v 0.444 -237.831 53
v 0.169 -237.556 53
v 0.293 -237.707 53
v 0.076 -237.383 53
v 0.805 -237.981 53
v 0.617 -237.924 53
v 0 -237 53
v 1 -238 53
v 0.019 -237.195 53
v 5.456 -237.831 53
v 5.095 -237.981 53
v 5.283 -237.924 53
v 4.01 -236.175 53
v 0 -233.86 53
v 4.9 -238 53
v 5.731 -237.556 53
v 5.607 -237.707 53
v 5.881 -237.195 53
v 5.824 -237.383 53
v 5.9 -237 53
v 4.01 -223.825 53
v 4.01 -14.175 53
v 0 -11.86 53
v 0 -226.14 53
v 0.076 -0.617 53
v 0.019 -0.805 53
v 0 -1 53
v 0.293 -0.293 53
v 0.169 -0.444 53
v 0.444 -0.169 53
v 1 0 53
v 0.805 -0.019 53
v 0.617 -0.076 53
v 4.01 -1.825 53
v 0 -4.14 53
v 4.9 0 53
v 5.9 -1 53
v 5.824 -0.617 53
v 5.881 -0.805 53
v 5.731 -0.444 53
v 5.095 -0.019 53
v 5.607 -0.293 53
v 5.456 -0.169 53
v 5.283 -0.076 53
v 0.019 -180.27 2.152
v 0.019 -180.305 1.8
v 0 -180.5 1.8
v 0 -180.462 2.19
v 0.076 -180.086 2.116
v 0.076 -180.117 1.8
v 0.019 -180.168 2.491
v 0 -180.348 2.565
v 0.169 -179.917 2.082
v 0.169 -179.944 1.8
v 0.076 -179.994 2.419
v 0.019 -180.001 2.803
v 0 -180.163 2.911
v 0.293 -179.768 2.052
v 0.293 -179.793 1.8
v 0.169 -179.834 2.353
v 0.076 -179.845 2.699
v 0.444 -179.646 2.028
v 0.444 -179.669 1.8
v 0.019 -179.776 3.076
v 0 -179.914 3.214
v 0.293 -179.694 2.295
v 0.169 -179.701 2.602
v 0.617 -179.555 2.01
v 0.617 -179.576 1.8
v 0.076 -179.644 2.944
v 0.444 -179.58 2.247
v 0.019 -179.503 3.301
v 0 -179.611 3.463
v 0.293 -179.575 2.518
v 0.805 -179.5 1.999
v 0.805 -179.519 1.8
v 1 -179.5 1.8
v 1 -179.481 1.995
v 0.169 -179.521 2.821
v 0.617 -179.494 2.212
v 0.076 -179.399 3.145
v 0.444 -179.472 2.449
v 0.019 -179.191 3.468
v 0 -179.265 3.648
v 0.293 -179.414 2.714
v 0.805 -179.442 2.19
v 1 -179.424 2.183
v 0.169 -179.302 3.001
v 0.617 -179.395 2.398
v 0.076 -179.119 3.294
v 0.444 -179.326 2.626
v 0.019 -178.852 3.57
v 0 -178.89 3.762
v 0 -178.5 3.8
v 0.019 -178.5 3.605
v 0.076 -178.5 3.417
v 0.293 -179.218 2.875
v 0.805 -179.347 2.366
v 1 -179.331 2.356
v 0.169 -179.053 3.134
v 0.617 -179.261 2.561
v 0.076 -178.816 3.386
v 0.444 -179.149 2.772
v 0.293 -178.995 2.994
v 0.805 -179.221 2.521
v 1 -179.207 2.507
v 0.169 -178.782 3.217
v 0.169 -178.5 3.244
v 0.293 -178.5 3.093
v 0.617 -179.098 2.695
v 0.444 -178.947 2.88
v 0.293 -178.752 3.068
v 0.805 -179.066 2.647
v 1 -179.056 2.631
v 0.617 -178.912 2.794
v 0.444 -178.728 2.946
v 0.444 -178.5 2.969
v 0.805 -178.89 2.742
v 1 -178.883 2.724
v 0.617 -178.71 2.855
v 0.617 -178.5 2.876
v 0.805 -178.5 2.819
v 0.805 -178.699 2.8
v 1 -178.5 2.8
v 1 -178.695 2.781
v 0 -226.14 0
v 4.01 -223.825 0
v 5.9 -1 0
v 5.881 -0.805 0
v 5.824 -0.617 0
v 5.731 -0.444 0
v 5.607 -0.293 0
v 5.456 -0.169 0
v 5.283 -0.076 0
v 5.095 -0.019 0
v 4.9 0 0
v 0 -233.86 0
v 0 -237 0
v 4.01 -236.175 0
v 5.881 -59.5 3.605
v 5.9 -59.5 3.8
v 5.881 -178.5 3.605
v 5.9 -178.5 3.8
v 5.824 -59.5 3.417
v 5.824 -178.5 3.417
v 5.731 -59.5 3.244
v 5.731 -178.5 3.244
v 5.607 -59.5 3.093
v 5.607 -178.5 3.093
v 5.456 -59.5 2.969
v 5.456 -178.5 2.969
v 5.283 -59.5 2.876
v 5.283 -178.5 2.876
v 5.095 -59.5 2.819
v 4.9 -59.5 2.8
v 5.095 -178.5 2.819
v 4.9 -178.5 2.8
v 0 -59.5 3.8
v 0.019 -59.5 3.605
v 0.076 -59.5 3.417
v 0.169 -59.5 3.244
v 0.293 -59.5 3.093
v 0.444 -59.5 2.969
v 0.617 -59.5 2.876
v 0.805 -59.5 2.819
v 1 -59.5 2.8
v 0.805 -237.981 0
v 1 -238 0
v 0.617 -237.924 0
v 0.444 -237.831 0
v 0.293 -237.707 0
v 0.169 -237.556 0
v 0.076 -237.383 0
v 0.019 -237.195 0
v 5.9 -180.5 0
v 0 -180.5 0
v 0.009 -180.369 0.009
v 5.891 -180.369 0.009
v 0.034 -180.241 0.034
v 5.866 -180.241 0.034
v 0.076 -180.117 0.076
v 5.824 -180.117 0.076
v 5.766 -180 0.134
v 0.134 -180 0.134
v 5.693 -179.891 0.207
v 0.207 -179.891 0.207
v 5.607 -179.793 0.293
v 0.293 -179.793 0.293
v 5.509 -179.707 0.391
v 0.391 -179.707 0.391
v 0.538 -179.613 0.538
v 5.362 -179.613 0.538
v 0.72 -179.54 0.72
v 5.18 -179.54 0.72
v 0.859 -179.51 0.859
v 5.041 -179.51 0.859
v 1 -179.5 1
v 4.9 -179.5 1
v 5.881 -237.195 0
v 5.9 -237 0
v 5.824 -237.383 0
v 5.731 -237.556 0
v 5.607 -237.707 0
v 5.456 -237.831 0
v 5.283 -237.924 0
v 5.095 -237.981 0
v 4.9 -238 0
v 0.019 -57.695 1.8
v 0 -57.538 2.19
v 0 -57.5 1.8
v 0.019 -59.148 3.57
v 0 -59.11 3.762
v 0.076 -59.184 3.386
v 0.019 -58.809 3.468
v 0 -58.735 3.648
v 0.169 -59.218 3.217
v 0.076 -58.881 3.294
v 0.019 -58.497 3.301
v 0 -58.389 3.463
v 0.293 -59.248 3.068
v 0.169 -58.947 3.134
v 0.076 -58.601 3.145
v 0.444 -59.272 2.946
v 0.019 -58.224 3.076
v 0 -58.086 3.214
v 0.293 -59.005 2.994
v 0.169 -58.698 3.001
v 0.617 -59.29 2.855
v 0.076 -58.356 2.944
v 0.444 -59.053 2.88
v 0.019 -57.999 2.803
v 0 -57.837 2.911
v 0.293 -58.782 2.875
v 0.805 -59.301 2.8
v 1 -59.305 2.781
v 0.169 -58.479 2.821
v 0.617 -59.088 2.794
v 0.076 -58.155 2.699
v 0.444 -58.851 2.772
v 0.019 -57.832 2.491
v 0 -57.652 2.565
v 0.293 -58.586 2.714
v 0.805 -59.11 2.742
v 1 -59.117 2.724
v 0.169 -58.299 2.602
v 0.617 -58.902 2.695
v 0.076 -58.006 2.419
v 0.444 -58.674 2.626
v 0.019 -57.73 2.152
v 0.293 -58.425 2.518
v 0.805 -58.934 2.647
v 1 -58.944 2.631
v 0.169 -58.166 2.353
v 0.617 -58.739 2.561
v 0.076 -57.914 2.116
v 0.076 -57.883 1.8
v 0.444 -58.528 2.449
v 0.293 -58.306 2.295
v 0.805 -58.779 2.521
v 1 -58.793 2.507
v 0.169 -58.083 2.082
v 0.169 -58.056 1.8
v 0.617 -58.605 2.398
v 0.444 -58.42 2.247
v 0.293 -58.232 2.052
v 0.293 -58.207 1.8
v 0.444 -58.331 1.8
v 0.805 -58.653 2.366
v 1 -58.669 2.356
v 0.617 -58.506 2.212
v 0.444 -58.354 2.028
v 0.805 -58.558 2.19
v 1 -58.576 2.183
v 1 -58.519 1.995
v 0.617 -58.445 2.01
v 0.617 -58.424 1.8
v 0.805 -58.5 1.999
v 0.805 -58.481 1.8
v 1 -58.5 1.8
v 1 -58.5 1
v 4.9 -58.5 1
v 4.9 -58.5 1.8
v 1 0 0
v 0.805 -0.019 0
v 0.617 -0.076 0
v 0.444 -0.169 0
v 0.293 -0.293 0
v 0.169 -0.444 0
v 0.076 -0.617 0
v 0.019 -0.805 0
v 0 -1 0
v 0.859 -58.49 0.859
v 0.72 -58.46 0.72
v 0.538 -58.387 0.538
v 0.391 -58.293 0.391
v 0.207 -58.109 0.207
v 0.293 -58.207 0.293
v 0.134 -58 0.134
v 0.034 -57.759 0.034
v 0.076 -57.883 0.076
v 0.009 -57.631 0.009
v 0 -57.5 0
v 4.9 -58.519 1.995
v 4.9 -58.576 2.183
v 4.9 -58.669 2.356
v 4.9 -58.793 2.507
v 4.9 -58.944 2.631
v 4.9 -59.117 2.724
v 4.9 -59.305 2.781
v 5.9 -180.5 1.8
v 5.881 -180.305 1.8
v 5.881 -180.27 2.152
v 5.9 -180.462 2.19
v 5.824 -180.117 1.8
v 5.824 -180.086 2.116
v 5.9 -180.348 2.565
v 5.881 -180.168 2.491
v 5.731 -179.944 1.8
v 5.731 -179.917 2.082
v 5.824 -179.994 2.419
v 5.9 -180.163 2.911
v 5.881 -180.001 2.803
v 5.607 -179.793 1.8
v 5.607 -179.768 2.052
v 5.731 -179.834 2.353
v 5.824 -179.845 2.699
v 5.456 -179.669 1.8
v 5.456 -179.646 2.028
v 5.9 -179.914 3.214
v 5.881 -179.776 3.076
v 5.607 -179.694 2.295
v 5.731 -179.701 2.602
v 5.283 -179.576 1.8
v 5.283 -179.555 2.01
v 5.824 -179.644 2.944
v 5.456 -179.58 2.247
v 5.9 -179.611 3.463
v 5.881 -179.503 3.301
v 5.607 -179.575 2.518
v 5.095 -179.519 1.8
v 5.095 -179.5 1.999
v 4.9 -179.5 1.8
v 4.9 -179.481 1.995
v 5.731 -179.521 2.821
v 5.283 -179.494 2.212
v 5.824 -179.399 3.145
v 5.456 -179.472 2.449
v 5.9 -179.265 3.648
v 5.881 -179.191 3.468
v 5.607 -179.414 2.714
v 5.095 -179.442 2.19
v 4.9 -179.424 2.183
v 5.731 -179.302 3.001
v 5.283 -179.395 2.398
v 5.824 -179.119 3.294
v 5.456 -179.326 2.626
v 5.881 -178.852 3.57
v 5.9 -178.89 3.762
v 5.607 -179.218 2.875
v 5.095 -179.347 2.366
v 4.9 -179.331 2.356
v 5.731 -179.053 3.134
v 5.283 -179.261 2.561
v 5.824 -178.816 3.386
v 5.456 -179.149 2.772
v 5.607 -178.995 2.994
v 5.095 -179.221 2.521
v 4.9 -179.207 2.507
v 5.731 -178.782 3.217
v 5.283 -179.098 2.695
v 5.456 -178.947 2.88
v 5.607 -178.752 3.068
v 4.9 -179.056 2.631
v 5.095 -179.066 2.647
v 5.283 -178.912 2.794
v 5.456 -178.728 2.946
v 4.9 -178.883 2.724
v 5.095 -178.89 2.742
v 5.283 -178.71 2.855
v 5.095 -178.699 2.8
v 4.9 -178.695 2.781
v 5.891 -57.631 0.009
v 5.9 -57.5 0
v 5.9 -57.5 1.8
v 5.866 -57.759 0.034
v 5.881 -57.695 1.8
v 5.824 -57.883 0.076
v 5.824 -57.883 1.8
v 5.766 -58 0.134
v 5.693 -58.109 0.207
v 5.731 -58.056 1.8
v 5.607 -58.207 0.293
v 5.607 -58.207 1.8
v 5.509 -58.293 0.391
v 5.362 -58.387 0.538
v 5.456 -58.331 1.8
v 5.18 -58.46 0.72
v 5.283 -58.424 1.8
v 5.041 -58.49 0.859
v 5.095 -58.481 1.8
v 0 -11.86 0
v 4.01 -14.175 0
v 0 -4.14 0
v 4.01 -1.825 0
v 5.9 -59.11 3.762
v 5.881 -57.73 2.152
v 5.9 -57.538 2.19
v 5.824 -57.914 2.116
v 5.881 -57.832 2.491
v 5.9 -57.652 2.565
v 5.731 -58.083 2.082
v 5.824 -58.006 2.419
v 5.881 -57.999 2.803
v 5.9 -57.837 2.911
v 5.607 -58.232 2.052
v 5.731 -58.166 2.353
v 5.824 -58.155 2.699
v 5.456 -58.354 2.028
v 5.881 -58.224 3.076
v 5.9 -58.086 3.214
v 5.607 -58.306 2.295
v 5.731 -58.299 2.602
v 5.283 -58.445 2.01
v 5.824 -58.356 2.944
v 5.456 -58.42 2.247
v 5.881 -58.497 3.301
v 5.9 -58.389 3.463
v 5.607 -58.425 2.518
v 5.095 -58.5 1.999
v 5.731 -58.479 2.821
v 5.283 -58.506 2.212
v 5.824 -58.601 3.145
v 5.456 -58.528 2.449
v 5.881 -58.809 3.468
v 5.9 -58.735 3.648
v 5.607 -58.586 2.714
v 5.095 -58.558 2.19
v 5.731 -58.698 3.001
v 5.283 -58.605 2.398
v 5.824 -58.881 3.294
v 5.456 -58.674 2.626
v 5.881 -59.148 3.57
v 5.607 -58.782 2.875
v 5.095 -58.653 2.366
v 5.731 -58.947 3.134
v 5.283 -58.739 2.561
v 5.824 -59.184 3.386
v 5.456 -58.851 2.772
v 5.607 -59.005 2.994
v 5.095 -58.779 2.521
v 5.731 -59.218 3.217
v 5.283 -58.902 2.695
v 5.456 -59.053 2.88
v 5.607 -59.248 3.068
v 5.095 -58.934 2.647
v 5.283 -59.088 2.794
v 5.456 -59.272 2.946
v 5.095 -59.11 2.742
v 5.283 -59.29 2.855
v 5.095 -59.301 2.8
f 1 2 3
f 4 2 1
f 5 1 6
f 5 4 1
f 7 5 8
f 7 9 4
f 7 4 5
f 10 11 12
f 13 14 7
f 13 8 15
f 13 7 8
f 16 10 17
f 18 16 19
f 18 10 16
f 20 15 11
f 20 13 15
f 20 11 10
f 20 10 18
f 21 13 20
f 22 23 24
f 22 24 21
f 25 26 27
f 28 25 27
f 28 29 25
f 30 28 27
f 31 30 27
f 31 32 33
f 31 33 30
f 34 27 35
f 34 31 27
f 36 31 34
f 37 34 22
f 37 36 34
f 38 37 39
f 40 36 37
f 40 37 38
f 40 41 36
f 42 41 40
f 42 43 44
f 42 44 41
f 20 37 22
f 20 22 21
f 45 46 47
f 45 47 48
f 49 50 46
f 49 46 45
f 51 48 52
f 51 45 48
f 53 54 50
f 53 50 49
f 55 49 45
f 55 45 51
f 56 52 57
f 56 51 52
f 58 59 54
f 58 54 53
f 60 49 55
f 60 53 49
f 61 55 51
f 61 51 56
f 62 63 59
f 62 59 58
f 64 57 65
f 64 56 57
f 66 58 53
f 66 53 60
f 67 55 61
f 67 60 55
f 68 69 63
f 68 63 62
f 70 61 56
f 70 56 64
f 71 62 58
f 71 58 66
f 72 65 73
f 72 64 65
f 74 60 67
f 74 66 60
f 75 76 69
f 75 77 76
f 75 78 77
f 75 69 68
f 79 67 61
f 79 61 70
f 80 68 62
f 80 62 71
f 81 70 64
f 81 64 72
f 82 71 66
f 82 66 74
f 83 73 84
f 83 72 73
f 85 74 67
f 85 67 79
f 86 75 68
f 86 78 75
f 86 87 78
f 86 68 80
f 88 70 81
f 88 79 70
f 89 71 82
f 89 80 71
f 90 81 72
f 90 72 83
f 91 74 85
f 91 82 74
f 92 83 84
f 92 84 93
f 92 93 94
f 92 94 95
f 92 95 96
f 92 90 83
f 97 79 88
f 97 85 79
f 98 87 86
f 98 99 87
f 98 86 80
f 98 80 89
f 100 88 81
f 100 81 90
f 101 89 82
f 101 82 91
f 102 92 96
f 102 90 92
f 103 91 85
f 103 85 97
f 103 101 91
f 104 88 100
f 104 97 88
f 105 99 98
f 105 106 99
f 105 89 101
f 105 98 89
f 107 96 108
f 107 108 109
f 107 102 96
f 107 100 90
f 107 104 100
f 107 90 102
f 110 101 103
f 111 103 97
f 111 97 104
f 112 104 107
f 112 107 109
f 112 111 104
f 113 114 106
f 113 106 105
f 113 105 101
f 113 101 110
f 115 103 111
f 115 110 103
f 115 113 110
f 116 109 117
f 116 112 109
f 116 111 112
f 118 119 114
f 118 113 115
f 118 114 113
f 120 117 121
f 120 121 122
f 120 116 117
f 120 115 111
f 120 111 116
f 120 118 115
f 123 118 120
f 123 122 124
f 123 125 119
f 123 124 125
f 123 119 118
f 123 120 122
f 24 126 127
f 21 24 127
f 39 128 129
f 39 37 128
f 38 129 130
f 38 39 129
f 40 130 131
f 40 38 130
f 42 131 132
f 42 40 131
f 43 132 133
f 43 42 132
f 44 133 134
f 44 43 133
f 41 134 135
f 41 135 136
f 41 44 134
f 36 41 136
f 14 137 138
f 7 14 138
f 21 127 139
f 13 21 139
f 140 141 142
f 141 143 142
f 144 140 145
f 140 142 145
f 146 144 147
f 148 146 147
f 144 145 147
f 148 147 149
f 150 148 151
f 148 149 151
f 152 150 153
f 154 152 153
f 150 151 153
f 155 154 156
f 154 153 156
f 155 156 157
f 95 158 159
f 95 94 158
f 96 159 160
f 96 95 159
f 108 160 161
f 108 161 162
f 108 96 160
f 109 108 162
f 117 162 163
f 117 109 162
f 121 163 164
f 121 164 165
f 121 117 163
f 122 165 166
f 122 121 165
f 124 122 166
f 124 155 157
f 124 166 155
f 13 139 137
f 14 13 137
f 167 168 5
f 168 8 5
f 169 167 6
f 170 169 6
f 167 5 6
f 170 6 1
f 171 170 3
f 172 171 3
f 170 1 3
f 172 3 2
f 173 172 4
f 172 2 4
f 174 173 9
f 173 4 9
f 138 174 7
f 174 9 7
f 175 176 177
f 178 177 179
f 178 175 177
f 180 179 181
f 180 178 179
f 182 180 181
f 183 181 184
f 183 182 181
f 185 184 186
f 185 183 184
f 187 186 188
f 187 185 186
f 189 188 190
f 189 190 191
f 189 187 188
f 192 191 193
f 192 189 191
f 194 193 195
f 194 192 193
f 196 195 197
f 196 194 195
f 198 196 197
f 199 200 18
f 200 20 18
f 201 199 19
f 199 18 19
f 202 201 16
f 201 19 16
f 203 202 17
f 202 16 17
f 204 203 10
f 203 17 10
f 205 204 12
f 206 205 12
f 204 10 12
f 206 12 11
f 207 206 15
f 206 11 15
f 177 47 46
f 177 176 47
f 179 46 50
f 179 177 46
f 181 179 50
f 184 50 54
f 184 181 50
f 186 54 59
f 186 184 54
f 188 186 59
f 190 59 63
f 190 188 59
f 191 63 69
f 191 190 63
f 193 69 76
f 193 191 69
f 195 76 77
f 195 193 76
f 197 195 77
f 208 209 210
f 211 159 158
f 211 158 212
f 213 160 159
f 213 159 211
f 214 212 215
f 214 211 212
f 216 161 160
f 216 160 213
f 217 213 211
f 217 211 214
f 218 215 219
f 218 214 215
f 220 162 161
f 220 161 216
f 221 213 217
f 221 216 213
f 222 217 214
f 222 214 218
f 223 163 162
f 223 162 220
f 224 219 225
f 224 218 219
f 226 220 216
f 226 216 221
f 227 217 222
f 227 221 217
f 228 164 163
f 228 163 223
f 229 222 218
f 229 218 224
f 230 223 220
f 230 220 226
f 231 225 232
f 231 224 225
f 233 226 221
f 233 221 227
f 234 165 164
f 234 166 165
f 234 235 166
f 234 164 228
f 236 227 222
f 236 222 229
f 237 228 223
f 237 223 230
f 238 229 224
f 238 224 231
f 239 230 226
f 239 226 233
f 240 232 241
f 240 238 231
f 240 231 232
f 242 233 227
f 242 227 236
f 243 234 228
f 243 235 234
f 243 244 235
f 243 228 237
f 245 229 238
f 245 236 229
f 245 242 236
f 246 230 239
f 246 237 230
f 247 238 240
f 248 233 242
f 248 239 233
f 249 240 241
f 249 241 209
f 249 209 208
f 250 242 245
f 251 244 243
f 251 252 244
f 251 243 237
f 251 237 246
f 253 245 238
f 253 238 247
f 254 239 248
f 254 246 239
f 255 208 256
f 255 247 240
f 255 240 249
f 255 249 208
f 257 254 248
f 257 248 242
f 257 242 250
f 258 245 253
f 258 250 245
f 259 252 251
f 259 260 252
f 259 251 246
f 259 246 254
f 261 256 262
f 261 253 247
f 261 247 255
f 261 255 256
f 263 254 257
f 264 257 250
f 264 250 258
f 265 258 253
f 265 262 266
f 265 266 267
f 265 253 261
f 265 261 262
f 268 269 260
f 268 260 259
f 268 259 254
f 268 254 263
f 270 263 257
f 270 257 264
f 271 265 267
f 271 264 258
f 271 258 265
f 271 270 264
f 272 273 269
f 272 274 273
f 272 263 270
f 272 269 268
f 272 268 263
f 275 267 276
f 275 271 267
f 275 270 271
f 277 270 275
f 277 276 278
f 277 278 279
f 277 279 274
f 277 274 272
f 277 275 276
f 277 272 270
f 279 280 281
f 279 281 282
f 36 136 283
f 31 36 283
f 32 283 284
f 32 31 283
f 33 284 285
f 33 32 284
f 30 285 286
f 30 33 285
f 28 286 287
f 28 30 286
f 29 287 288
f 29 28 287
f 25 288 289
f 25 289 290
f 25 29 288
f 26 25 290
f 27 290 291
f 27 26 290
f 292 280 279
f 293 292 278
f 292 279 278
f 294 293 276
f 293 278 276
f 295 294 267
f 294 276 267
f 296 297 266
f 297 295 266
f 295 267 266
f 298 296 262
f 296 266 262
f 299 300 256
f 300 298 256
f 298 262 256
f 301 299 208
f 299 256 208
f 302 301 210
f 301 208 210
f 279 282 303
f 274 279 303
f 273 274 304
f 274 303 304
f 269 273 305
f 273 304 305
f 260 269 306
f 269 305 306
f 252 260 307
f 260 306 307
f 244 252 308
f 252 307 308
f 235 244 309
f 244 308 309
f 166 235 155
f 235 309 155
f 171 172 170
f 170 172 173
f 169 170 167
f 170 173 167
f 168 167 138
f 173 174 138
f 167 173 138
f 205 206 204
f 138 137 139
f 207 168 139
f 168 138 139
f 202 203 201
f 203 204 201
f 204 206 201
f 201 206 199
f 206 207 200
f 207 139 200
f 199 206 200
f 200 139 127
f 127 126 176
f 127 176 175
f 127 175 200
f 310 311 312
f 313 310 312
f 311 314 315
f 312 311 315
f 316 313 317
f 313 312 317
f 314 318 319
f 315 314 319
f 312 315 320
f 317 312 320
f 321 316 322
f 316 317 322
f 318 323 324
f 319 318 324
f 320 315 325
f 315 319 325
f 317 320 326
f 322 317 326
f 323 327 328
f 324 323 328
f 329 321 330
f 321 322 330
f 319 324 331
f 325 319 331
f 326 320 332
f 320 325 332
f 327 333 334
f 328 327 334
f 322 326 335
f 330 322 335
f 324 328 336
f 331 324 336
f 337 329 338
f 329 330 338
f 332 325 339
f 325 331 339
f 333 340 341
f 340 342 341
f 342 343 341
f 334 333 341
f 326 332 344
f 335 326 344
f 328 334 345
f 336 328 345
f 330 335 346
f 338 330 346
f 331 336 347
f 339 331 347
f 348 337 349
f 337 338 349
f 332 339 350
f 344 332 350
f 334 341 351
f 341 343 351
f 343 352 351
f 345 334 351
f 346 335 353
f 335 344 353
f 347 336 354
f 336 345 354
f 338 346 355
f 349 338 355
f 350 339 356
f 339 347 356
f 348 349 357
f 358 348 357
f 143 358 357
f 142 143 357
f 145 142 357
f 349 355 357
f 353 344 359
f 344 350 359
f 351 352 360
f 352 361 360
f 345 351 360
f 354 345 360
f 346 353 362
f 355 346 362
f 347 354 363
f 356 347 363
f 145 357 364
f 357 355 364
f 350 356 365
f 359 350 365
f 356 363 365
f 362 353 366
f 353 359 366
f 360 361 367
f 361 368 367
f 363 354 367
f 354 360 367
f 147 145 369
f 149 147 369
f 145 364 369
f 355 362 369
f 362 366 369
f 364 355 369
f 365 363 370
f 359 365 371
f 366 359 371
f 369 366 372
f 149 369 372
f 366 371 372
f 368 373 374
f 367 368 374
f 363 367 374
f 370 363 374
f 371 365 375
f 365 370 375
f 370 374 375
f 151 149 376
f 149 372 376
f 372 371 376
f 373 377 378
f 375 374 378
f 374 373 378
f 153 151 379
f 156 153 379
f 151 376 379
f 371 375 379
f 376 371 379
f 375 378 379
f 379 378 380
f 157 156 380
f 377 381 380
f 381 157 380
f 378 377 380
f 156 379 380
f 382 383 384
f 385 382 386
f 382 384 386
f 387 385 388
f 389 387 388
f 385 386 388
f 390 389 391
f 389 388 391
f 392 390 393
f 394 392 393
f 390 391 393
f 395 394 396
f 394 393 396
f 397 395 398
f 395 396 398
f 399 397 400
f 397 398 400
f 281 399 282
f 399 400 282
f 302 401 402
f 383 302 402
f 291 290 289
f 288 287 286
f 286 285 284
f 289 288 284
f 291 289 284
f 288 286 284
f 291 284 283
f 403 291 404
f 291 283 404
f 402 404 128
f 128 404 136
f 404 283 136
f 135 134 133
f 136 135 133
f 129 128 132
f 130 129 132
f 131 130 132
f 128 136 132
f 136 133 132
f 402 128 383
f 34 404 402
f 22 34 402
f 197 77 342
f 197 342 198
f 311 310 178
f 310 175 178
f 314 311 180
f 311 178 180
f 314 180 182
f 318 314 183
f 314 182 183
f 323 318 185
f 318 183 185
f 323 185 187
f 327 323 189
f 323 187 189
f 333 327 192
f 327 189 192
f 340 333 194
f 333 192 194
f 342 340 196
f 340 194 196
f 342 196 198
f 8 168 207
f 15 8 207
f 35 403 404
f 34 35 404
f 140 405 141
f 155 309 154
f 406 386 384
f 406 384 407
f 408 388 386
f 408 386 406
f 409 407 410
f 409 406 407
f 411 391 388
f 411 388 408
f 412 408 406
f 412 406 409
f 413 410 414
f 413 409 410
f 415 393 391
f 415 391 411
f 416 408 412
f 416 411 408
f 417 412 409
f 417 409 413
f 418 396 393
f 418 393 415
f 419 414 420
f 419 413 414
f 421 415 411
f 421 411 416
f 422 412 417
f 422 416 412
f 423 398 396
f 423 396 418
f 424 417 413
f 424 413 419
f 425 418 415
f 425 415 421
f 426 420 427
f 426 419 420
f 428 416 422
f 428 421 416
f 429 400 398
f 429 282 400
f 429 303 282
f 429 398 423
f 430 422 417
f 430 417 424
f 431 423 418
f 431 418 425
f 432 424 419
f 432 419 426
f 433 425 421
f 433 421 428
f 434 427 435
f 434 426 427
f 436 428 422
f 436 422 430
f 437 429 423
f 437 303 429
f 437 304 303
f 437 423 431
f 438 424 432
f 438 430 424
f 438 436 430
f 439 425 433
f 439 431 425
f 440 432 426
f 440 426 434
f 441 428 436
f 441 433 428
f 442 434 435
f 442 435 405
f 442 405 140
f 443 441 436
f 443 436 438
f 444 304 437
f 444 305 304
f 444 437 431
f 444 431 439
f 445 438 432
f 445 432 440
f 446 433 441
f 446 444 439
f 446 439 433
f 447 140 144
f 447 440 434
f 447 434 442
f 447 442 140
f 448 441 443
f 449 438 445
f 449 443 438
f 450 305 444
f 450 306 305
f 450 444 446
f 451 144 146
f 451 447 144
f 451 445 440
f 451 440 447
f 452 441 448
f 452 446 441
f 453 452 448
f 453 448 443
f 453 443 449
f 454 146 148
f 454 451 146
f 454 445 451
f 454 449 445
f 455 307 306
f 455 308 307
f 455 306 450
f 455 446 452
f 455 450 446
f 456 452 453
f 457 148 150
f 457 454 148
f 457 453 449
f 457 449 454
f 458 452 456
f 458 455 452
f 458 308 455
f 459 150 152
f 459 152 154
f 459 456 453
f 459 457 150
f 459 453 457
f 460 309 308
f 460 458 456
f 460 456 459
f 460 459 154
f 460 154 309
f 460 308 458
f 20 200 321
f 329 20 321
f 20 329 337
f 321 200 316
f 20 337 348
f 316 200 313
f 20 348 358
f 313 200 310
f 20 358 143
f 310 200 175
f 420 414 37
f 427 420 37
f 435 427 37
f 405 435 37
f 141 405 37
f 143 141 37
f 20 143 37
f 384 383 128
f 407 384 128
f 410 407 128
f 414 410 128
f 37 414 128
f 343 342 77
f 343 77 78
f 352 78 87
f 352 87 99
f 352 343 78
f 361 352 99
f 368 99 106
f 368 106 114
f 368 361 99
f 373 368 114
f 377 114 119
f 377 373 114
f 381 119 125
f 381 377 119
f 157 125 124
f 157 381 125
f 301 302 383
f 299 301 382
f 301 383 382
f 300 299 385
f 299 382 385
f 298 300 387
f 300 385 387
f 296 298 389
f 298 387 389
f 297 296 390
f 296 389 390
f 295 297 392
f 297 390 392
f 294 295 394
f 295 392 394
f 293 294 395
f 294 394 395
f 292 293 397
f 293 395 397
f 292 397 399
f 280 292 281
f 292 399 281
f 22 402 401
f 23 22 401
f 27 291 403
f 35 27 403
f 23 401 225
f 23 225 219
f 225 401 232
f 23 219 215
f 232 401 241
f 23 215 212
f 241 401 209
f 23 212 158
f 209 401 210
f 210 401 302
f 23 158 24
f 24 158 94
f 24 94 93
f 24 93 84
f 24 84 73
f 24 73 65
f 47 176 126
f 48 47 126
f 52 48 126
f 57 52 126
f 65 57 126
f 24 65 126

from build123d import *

# Parameters (mm, degrees)
BOSS_EXTRUDE1_DEPTH = 53
CUT_EXTRUDE1_DEPTH  = 52
FILLET1_R           = 1
FILLET2_R           = 1


with BuildPart() as part:
    # Sketch2 → Boss-Extrude1 (new body)
    with BuildSketch(Plane.XY):
        Polygon((0, 0), (0, -4.14), (4.00969762, -1.825), (4.00969762, -14.175), (0, -11.86), (0, -19), (0, -219), (0, -226.14), (4.00969762, -223.825), (4.00969762, -236.175), (0, -233.86), (0, -238), (5.9, -238), (5.9, -229.334408546), (5.9, -8.665591454), (5.9, 0), align=None)
    extrude(amount=BOSS_EXTRUDE1_DEPTH)

    # Sketch3 → Cut-Extrude1 (cut)
    with BuildSketch(Plane(origin=(0, 0, 0), x_dir=(0, 0, -1), z_dir=(1, 0, 0))):
        Polygon((0, -119), (0, -58.5), (-2.8, -58.5), (-2.8, -179.5), (0, -179.5), align=None)
    extrude(amount=CUT_EXTRUDE1_DEPTH, mode=Mode.SUBTRACT)

    # Fillet1
    fillet1_edges = [part.edges().sort_by_distance(p)[0] for p in [
        (2.95, -179.5, 0),
        (2.95, -58.5, 0),
        (5.9, -119, 2.8),
        (2.95, -58.5, 2.8),
        (0, -119, 2.8),
        (0, -58.5, 1.4),
        (2.95, -179.5, 2.8),
        (0, -179.5, 1.4),
        (5.9, -58.5, 1.4),
        (5.9, -179.5, 1.4),
    ]]
    fillet(fillet1_edges, radius=FILLET1_R)

    # Fillet2
    fillet2_edges = [part.edges().sort_by_distance(p)[0] for p in [
        (5.9, 0, 26.5),
        (5.9, -238, 26.5),
        (0, -238, 26.5),
        (0, 0, 26.5),
    ]]
    fillet(fillet2_edges, radius=FILLET2_R)


solid = part.part
